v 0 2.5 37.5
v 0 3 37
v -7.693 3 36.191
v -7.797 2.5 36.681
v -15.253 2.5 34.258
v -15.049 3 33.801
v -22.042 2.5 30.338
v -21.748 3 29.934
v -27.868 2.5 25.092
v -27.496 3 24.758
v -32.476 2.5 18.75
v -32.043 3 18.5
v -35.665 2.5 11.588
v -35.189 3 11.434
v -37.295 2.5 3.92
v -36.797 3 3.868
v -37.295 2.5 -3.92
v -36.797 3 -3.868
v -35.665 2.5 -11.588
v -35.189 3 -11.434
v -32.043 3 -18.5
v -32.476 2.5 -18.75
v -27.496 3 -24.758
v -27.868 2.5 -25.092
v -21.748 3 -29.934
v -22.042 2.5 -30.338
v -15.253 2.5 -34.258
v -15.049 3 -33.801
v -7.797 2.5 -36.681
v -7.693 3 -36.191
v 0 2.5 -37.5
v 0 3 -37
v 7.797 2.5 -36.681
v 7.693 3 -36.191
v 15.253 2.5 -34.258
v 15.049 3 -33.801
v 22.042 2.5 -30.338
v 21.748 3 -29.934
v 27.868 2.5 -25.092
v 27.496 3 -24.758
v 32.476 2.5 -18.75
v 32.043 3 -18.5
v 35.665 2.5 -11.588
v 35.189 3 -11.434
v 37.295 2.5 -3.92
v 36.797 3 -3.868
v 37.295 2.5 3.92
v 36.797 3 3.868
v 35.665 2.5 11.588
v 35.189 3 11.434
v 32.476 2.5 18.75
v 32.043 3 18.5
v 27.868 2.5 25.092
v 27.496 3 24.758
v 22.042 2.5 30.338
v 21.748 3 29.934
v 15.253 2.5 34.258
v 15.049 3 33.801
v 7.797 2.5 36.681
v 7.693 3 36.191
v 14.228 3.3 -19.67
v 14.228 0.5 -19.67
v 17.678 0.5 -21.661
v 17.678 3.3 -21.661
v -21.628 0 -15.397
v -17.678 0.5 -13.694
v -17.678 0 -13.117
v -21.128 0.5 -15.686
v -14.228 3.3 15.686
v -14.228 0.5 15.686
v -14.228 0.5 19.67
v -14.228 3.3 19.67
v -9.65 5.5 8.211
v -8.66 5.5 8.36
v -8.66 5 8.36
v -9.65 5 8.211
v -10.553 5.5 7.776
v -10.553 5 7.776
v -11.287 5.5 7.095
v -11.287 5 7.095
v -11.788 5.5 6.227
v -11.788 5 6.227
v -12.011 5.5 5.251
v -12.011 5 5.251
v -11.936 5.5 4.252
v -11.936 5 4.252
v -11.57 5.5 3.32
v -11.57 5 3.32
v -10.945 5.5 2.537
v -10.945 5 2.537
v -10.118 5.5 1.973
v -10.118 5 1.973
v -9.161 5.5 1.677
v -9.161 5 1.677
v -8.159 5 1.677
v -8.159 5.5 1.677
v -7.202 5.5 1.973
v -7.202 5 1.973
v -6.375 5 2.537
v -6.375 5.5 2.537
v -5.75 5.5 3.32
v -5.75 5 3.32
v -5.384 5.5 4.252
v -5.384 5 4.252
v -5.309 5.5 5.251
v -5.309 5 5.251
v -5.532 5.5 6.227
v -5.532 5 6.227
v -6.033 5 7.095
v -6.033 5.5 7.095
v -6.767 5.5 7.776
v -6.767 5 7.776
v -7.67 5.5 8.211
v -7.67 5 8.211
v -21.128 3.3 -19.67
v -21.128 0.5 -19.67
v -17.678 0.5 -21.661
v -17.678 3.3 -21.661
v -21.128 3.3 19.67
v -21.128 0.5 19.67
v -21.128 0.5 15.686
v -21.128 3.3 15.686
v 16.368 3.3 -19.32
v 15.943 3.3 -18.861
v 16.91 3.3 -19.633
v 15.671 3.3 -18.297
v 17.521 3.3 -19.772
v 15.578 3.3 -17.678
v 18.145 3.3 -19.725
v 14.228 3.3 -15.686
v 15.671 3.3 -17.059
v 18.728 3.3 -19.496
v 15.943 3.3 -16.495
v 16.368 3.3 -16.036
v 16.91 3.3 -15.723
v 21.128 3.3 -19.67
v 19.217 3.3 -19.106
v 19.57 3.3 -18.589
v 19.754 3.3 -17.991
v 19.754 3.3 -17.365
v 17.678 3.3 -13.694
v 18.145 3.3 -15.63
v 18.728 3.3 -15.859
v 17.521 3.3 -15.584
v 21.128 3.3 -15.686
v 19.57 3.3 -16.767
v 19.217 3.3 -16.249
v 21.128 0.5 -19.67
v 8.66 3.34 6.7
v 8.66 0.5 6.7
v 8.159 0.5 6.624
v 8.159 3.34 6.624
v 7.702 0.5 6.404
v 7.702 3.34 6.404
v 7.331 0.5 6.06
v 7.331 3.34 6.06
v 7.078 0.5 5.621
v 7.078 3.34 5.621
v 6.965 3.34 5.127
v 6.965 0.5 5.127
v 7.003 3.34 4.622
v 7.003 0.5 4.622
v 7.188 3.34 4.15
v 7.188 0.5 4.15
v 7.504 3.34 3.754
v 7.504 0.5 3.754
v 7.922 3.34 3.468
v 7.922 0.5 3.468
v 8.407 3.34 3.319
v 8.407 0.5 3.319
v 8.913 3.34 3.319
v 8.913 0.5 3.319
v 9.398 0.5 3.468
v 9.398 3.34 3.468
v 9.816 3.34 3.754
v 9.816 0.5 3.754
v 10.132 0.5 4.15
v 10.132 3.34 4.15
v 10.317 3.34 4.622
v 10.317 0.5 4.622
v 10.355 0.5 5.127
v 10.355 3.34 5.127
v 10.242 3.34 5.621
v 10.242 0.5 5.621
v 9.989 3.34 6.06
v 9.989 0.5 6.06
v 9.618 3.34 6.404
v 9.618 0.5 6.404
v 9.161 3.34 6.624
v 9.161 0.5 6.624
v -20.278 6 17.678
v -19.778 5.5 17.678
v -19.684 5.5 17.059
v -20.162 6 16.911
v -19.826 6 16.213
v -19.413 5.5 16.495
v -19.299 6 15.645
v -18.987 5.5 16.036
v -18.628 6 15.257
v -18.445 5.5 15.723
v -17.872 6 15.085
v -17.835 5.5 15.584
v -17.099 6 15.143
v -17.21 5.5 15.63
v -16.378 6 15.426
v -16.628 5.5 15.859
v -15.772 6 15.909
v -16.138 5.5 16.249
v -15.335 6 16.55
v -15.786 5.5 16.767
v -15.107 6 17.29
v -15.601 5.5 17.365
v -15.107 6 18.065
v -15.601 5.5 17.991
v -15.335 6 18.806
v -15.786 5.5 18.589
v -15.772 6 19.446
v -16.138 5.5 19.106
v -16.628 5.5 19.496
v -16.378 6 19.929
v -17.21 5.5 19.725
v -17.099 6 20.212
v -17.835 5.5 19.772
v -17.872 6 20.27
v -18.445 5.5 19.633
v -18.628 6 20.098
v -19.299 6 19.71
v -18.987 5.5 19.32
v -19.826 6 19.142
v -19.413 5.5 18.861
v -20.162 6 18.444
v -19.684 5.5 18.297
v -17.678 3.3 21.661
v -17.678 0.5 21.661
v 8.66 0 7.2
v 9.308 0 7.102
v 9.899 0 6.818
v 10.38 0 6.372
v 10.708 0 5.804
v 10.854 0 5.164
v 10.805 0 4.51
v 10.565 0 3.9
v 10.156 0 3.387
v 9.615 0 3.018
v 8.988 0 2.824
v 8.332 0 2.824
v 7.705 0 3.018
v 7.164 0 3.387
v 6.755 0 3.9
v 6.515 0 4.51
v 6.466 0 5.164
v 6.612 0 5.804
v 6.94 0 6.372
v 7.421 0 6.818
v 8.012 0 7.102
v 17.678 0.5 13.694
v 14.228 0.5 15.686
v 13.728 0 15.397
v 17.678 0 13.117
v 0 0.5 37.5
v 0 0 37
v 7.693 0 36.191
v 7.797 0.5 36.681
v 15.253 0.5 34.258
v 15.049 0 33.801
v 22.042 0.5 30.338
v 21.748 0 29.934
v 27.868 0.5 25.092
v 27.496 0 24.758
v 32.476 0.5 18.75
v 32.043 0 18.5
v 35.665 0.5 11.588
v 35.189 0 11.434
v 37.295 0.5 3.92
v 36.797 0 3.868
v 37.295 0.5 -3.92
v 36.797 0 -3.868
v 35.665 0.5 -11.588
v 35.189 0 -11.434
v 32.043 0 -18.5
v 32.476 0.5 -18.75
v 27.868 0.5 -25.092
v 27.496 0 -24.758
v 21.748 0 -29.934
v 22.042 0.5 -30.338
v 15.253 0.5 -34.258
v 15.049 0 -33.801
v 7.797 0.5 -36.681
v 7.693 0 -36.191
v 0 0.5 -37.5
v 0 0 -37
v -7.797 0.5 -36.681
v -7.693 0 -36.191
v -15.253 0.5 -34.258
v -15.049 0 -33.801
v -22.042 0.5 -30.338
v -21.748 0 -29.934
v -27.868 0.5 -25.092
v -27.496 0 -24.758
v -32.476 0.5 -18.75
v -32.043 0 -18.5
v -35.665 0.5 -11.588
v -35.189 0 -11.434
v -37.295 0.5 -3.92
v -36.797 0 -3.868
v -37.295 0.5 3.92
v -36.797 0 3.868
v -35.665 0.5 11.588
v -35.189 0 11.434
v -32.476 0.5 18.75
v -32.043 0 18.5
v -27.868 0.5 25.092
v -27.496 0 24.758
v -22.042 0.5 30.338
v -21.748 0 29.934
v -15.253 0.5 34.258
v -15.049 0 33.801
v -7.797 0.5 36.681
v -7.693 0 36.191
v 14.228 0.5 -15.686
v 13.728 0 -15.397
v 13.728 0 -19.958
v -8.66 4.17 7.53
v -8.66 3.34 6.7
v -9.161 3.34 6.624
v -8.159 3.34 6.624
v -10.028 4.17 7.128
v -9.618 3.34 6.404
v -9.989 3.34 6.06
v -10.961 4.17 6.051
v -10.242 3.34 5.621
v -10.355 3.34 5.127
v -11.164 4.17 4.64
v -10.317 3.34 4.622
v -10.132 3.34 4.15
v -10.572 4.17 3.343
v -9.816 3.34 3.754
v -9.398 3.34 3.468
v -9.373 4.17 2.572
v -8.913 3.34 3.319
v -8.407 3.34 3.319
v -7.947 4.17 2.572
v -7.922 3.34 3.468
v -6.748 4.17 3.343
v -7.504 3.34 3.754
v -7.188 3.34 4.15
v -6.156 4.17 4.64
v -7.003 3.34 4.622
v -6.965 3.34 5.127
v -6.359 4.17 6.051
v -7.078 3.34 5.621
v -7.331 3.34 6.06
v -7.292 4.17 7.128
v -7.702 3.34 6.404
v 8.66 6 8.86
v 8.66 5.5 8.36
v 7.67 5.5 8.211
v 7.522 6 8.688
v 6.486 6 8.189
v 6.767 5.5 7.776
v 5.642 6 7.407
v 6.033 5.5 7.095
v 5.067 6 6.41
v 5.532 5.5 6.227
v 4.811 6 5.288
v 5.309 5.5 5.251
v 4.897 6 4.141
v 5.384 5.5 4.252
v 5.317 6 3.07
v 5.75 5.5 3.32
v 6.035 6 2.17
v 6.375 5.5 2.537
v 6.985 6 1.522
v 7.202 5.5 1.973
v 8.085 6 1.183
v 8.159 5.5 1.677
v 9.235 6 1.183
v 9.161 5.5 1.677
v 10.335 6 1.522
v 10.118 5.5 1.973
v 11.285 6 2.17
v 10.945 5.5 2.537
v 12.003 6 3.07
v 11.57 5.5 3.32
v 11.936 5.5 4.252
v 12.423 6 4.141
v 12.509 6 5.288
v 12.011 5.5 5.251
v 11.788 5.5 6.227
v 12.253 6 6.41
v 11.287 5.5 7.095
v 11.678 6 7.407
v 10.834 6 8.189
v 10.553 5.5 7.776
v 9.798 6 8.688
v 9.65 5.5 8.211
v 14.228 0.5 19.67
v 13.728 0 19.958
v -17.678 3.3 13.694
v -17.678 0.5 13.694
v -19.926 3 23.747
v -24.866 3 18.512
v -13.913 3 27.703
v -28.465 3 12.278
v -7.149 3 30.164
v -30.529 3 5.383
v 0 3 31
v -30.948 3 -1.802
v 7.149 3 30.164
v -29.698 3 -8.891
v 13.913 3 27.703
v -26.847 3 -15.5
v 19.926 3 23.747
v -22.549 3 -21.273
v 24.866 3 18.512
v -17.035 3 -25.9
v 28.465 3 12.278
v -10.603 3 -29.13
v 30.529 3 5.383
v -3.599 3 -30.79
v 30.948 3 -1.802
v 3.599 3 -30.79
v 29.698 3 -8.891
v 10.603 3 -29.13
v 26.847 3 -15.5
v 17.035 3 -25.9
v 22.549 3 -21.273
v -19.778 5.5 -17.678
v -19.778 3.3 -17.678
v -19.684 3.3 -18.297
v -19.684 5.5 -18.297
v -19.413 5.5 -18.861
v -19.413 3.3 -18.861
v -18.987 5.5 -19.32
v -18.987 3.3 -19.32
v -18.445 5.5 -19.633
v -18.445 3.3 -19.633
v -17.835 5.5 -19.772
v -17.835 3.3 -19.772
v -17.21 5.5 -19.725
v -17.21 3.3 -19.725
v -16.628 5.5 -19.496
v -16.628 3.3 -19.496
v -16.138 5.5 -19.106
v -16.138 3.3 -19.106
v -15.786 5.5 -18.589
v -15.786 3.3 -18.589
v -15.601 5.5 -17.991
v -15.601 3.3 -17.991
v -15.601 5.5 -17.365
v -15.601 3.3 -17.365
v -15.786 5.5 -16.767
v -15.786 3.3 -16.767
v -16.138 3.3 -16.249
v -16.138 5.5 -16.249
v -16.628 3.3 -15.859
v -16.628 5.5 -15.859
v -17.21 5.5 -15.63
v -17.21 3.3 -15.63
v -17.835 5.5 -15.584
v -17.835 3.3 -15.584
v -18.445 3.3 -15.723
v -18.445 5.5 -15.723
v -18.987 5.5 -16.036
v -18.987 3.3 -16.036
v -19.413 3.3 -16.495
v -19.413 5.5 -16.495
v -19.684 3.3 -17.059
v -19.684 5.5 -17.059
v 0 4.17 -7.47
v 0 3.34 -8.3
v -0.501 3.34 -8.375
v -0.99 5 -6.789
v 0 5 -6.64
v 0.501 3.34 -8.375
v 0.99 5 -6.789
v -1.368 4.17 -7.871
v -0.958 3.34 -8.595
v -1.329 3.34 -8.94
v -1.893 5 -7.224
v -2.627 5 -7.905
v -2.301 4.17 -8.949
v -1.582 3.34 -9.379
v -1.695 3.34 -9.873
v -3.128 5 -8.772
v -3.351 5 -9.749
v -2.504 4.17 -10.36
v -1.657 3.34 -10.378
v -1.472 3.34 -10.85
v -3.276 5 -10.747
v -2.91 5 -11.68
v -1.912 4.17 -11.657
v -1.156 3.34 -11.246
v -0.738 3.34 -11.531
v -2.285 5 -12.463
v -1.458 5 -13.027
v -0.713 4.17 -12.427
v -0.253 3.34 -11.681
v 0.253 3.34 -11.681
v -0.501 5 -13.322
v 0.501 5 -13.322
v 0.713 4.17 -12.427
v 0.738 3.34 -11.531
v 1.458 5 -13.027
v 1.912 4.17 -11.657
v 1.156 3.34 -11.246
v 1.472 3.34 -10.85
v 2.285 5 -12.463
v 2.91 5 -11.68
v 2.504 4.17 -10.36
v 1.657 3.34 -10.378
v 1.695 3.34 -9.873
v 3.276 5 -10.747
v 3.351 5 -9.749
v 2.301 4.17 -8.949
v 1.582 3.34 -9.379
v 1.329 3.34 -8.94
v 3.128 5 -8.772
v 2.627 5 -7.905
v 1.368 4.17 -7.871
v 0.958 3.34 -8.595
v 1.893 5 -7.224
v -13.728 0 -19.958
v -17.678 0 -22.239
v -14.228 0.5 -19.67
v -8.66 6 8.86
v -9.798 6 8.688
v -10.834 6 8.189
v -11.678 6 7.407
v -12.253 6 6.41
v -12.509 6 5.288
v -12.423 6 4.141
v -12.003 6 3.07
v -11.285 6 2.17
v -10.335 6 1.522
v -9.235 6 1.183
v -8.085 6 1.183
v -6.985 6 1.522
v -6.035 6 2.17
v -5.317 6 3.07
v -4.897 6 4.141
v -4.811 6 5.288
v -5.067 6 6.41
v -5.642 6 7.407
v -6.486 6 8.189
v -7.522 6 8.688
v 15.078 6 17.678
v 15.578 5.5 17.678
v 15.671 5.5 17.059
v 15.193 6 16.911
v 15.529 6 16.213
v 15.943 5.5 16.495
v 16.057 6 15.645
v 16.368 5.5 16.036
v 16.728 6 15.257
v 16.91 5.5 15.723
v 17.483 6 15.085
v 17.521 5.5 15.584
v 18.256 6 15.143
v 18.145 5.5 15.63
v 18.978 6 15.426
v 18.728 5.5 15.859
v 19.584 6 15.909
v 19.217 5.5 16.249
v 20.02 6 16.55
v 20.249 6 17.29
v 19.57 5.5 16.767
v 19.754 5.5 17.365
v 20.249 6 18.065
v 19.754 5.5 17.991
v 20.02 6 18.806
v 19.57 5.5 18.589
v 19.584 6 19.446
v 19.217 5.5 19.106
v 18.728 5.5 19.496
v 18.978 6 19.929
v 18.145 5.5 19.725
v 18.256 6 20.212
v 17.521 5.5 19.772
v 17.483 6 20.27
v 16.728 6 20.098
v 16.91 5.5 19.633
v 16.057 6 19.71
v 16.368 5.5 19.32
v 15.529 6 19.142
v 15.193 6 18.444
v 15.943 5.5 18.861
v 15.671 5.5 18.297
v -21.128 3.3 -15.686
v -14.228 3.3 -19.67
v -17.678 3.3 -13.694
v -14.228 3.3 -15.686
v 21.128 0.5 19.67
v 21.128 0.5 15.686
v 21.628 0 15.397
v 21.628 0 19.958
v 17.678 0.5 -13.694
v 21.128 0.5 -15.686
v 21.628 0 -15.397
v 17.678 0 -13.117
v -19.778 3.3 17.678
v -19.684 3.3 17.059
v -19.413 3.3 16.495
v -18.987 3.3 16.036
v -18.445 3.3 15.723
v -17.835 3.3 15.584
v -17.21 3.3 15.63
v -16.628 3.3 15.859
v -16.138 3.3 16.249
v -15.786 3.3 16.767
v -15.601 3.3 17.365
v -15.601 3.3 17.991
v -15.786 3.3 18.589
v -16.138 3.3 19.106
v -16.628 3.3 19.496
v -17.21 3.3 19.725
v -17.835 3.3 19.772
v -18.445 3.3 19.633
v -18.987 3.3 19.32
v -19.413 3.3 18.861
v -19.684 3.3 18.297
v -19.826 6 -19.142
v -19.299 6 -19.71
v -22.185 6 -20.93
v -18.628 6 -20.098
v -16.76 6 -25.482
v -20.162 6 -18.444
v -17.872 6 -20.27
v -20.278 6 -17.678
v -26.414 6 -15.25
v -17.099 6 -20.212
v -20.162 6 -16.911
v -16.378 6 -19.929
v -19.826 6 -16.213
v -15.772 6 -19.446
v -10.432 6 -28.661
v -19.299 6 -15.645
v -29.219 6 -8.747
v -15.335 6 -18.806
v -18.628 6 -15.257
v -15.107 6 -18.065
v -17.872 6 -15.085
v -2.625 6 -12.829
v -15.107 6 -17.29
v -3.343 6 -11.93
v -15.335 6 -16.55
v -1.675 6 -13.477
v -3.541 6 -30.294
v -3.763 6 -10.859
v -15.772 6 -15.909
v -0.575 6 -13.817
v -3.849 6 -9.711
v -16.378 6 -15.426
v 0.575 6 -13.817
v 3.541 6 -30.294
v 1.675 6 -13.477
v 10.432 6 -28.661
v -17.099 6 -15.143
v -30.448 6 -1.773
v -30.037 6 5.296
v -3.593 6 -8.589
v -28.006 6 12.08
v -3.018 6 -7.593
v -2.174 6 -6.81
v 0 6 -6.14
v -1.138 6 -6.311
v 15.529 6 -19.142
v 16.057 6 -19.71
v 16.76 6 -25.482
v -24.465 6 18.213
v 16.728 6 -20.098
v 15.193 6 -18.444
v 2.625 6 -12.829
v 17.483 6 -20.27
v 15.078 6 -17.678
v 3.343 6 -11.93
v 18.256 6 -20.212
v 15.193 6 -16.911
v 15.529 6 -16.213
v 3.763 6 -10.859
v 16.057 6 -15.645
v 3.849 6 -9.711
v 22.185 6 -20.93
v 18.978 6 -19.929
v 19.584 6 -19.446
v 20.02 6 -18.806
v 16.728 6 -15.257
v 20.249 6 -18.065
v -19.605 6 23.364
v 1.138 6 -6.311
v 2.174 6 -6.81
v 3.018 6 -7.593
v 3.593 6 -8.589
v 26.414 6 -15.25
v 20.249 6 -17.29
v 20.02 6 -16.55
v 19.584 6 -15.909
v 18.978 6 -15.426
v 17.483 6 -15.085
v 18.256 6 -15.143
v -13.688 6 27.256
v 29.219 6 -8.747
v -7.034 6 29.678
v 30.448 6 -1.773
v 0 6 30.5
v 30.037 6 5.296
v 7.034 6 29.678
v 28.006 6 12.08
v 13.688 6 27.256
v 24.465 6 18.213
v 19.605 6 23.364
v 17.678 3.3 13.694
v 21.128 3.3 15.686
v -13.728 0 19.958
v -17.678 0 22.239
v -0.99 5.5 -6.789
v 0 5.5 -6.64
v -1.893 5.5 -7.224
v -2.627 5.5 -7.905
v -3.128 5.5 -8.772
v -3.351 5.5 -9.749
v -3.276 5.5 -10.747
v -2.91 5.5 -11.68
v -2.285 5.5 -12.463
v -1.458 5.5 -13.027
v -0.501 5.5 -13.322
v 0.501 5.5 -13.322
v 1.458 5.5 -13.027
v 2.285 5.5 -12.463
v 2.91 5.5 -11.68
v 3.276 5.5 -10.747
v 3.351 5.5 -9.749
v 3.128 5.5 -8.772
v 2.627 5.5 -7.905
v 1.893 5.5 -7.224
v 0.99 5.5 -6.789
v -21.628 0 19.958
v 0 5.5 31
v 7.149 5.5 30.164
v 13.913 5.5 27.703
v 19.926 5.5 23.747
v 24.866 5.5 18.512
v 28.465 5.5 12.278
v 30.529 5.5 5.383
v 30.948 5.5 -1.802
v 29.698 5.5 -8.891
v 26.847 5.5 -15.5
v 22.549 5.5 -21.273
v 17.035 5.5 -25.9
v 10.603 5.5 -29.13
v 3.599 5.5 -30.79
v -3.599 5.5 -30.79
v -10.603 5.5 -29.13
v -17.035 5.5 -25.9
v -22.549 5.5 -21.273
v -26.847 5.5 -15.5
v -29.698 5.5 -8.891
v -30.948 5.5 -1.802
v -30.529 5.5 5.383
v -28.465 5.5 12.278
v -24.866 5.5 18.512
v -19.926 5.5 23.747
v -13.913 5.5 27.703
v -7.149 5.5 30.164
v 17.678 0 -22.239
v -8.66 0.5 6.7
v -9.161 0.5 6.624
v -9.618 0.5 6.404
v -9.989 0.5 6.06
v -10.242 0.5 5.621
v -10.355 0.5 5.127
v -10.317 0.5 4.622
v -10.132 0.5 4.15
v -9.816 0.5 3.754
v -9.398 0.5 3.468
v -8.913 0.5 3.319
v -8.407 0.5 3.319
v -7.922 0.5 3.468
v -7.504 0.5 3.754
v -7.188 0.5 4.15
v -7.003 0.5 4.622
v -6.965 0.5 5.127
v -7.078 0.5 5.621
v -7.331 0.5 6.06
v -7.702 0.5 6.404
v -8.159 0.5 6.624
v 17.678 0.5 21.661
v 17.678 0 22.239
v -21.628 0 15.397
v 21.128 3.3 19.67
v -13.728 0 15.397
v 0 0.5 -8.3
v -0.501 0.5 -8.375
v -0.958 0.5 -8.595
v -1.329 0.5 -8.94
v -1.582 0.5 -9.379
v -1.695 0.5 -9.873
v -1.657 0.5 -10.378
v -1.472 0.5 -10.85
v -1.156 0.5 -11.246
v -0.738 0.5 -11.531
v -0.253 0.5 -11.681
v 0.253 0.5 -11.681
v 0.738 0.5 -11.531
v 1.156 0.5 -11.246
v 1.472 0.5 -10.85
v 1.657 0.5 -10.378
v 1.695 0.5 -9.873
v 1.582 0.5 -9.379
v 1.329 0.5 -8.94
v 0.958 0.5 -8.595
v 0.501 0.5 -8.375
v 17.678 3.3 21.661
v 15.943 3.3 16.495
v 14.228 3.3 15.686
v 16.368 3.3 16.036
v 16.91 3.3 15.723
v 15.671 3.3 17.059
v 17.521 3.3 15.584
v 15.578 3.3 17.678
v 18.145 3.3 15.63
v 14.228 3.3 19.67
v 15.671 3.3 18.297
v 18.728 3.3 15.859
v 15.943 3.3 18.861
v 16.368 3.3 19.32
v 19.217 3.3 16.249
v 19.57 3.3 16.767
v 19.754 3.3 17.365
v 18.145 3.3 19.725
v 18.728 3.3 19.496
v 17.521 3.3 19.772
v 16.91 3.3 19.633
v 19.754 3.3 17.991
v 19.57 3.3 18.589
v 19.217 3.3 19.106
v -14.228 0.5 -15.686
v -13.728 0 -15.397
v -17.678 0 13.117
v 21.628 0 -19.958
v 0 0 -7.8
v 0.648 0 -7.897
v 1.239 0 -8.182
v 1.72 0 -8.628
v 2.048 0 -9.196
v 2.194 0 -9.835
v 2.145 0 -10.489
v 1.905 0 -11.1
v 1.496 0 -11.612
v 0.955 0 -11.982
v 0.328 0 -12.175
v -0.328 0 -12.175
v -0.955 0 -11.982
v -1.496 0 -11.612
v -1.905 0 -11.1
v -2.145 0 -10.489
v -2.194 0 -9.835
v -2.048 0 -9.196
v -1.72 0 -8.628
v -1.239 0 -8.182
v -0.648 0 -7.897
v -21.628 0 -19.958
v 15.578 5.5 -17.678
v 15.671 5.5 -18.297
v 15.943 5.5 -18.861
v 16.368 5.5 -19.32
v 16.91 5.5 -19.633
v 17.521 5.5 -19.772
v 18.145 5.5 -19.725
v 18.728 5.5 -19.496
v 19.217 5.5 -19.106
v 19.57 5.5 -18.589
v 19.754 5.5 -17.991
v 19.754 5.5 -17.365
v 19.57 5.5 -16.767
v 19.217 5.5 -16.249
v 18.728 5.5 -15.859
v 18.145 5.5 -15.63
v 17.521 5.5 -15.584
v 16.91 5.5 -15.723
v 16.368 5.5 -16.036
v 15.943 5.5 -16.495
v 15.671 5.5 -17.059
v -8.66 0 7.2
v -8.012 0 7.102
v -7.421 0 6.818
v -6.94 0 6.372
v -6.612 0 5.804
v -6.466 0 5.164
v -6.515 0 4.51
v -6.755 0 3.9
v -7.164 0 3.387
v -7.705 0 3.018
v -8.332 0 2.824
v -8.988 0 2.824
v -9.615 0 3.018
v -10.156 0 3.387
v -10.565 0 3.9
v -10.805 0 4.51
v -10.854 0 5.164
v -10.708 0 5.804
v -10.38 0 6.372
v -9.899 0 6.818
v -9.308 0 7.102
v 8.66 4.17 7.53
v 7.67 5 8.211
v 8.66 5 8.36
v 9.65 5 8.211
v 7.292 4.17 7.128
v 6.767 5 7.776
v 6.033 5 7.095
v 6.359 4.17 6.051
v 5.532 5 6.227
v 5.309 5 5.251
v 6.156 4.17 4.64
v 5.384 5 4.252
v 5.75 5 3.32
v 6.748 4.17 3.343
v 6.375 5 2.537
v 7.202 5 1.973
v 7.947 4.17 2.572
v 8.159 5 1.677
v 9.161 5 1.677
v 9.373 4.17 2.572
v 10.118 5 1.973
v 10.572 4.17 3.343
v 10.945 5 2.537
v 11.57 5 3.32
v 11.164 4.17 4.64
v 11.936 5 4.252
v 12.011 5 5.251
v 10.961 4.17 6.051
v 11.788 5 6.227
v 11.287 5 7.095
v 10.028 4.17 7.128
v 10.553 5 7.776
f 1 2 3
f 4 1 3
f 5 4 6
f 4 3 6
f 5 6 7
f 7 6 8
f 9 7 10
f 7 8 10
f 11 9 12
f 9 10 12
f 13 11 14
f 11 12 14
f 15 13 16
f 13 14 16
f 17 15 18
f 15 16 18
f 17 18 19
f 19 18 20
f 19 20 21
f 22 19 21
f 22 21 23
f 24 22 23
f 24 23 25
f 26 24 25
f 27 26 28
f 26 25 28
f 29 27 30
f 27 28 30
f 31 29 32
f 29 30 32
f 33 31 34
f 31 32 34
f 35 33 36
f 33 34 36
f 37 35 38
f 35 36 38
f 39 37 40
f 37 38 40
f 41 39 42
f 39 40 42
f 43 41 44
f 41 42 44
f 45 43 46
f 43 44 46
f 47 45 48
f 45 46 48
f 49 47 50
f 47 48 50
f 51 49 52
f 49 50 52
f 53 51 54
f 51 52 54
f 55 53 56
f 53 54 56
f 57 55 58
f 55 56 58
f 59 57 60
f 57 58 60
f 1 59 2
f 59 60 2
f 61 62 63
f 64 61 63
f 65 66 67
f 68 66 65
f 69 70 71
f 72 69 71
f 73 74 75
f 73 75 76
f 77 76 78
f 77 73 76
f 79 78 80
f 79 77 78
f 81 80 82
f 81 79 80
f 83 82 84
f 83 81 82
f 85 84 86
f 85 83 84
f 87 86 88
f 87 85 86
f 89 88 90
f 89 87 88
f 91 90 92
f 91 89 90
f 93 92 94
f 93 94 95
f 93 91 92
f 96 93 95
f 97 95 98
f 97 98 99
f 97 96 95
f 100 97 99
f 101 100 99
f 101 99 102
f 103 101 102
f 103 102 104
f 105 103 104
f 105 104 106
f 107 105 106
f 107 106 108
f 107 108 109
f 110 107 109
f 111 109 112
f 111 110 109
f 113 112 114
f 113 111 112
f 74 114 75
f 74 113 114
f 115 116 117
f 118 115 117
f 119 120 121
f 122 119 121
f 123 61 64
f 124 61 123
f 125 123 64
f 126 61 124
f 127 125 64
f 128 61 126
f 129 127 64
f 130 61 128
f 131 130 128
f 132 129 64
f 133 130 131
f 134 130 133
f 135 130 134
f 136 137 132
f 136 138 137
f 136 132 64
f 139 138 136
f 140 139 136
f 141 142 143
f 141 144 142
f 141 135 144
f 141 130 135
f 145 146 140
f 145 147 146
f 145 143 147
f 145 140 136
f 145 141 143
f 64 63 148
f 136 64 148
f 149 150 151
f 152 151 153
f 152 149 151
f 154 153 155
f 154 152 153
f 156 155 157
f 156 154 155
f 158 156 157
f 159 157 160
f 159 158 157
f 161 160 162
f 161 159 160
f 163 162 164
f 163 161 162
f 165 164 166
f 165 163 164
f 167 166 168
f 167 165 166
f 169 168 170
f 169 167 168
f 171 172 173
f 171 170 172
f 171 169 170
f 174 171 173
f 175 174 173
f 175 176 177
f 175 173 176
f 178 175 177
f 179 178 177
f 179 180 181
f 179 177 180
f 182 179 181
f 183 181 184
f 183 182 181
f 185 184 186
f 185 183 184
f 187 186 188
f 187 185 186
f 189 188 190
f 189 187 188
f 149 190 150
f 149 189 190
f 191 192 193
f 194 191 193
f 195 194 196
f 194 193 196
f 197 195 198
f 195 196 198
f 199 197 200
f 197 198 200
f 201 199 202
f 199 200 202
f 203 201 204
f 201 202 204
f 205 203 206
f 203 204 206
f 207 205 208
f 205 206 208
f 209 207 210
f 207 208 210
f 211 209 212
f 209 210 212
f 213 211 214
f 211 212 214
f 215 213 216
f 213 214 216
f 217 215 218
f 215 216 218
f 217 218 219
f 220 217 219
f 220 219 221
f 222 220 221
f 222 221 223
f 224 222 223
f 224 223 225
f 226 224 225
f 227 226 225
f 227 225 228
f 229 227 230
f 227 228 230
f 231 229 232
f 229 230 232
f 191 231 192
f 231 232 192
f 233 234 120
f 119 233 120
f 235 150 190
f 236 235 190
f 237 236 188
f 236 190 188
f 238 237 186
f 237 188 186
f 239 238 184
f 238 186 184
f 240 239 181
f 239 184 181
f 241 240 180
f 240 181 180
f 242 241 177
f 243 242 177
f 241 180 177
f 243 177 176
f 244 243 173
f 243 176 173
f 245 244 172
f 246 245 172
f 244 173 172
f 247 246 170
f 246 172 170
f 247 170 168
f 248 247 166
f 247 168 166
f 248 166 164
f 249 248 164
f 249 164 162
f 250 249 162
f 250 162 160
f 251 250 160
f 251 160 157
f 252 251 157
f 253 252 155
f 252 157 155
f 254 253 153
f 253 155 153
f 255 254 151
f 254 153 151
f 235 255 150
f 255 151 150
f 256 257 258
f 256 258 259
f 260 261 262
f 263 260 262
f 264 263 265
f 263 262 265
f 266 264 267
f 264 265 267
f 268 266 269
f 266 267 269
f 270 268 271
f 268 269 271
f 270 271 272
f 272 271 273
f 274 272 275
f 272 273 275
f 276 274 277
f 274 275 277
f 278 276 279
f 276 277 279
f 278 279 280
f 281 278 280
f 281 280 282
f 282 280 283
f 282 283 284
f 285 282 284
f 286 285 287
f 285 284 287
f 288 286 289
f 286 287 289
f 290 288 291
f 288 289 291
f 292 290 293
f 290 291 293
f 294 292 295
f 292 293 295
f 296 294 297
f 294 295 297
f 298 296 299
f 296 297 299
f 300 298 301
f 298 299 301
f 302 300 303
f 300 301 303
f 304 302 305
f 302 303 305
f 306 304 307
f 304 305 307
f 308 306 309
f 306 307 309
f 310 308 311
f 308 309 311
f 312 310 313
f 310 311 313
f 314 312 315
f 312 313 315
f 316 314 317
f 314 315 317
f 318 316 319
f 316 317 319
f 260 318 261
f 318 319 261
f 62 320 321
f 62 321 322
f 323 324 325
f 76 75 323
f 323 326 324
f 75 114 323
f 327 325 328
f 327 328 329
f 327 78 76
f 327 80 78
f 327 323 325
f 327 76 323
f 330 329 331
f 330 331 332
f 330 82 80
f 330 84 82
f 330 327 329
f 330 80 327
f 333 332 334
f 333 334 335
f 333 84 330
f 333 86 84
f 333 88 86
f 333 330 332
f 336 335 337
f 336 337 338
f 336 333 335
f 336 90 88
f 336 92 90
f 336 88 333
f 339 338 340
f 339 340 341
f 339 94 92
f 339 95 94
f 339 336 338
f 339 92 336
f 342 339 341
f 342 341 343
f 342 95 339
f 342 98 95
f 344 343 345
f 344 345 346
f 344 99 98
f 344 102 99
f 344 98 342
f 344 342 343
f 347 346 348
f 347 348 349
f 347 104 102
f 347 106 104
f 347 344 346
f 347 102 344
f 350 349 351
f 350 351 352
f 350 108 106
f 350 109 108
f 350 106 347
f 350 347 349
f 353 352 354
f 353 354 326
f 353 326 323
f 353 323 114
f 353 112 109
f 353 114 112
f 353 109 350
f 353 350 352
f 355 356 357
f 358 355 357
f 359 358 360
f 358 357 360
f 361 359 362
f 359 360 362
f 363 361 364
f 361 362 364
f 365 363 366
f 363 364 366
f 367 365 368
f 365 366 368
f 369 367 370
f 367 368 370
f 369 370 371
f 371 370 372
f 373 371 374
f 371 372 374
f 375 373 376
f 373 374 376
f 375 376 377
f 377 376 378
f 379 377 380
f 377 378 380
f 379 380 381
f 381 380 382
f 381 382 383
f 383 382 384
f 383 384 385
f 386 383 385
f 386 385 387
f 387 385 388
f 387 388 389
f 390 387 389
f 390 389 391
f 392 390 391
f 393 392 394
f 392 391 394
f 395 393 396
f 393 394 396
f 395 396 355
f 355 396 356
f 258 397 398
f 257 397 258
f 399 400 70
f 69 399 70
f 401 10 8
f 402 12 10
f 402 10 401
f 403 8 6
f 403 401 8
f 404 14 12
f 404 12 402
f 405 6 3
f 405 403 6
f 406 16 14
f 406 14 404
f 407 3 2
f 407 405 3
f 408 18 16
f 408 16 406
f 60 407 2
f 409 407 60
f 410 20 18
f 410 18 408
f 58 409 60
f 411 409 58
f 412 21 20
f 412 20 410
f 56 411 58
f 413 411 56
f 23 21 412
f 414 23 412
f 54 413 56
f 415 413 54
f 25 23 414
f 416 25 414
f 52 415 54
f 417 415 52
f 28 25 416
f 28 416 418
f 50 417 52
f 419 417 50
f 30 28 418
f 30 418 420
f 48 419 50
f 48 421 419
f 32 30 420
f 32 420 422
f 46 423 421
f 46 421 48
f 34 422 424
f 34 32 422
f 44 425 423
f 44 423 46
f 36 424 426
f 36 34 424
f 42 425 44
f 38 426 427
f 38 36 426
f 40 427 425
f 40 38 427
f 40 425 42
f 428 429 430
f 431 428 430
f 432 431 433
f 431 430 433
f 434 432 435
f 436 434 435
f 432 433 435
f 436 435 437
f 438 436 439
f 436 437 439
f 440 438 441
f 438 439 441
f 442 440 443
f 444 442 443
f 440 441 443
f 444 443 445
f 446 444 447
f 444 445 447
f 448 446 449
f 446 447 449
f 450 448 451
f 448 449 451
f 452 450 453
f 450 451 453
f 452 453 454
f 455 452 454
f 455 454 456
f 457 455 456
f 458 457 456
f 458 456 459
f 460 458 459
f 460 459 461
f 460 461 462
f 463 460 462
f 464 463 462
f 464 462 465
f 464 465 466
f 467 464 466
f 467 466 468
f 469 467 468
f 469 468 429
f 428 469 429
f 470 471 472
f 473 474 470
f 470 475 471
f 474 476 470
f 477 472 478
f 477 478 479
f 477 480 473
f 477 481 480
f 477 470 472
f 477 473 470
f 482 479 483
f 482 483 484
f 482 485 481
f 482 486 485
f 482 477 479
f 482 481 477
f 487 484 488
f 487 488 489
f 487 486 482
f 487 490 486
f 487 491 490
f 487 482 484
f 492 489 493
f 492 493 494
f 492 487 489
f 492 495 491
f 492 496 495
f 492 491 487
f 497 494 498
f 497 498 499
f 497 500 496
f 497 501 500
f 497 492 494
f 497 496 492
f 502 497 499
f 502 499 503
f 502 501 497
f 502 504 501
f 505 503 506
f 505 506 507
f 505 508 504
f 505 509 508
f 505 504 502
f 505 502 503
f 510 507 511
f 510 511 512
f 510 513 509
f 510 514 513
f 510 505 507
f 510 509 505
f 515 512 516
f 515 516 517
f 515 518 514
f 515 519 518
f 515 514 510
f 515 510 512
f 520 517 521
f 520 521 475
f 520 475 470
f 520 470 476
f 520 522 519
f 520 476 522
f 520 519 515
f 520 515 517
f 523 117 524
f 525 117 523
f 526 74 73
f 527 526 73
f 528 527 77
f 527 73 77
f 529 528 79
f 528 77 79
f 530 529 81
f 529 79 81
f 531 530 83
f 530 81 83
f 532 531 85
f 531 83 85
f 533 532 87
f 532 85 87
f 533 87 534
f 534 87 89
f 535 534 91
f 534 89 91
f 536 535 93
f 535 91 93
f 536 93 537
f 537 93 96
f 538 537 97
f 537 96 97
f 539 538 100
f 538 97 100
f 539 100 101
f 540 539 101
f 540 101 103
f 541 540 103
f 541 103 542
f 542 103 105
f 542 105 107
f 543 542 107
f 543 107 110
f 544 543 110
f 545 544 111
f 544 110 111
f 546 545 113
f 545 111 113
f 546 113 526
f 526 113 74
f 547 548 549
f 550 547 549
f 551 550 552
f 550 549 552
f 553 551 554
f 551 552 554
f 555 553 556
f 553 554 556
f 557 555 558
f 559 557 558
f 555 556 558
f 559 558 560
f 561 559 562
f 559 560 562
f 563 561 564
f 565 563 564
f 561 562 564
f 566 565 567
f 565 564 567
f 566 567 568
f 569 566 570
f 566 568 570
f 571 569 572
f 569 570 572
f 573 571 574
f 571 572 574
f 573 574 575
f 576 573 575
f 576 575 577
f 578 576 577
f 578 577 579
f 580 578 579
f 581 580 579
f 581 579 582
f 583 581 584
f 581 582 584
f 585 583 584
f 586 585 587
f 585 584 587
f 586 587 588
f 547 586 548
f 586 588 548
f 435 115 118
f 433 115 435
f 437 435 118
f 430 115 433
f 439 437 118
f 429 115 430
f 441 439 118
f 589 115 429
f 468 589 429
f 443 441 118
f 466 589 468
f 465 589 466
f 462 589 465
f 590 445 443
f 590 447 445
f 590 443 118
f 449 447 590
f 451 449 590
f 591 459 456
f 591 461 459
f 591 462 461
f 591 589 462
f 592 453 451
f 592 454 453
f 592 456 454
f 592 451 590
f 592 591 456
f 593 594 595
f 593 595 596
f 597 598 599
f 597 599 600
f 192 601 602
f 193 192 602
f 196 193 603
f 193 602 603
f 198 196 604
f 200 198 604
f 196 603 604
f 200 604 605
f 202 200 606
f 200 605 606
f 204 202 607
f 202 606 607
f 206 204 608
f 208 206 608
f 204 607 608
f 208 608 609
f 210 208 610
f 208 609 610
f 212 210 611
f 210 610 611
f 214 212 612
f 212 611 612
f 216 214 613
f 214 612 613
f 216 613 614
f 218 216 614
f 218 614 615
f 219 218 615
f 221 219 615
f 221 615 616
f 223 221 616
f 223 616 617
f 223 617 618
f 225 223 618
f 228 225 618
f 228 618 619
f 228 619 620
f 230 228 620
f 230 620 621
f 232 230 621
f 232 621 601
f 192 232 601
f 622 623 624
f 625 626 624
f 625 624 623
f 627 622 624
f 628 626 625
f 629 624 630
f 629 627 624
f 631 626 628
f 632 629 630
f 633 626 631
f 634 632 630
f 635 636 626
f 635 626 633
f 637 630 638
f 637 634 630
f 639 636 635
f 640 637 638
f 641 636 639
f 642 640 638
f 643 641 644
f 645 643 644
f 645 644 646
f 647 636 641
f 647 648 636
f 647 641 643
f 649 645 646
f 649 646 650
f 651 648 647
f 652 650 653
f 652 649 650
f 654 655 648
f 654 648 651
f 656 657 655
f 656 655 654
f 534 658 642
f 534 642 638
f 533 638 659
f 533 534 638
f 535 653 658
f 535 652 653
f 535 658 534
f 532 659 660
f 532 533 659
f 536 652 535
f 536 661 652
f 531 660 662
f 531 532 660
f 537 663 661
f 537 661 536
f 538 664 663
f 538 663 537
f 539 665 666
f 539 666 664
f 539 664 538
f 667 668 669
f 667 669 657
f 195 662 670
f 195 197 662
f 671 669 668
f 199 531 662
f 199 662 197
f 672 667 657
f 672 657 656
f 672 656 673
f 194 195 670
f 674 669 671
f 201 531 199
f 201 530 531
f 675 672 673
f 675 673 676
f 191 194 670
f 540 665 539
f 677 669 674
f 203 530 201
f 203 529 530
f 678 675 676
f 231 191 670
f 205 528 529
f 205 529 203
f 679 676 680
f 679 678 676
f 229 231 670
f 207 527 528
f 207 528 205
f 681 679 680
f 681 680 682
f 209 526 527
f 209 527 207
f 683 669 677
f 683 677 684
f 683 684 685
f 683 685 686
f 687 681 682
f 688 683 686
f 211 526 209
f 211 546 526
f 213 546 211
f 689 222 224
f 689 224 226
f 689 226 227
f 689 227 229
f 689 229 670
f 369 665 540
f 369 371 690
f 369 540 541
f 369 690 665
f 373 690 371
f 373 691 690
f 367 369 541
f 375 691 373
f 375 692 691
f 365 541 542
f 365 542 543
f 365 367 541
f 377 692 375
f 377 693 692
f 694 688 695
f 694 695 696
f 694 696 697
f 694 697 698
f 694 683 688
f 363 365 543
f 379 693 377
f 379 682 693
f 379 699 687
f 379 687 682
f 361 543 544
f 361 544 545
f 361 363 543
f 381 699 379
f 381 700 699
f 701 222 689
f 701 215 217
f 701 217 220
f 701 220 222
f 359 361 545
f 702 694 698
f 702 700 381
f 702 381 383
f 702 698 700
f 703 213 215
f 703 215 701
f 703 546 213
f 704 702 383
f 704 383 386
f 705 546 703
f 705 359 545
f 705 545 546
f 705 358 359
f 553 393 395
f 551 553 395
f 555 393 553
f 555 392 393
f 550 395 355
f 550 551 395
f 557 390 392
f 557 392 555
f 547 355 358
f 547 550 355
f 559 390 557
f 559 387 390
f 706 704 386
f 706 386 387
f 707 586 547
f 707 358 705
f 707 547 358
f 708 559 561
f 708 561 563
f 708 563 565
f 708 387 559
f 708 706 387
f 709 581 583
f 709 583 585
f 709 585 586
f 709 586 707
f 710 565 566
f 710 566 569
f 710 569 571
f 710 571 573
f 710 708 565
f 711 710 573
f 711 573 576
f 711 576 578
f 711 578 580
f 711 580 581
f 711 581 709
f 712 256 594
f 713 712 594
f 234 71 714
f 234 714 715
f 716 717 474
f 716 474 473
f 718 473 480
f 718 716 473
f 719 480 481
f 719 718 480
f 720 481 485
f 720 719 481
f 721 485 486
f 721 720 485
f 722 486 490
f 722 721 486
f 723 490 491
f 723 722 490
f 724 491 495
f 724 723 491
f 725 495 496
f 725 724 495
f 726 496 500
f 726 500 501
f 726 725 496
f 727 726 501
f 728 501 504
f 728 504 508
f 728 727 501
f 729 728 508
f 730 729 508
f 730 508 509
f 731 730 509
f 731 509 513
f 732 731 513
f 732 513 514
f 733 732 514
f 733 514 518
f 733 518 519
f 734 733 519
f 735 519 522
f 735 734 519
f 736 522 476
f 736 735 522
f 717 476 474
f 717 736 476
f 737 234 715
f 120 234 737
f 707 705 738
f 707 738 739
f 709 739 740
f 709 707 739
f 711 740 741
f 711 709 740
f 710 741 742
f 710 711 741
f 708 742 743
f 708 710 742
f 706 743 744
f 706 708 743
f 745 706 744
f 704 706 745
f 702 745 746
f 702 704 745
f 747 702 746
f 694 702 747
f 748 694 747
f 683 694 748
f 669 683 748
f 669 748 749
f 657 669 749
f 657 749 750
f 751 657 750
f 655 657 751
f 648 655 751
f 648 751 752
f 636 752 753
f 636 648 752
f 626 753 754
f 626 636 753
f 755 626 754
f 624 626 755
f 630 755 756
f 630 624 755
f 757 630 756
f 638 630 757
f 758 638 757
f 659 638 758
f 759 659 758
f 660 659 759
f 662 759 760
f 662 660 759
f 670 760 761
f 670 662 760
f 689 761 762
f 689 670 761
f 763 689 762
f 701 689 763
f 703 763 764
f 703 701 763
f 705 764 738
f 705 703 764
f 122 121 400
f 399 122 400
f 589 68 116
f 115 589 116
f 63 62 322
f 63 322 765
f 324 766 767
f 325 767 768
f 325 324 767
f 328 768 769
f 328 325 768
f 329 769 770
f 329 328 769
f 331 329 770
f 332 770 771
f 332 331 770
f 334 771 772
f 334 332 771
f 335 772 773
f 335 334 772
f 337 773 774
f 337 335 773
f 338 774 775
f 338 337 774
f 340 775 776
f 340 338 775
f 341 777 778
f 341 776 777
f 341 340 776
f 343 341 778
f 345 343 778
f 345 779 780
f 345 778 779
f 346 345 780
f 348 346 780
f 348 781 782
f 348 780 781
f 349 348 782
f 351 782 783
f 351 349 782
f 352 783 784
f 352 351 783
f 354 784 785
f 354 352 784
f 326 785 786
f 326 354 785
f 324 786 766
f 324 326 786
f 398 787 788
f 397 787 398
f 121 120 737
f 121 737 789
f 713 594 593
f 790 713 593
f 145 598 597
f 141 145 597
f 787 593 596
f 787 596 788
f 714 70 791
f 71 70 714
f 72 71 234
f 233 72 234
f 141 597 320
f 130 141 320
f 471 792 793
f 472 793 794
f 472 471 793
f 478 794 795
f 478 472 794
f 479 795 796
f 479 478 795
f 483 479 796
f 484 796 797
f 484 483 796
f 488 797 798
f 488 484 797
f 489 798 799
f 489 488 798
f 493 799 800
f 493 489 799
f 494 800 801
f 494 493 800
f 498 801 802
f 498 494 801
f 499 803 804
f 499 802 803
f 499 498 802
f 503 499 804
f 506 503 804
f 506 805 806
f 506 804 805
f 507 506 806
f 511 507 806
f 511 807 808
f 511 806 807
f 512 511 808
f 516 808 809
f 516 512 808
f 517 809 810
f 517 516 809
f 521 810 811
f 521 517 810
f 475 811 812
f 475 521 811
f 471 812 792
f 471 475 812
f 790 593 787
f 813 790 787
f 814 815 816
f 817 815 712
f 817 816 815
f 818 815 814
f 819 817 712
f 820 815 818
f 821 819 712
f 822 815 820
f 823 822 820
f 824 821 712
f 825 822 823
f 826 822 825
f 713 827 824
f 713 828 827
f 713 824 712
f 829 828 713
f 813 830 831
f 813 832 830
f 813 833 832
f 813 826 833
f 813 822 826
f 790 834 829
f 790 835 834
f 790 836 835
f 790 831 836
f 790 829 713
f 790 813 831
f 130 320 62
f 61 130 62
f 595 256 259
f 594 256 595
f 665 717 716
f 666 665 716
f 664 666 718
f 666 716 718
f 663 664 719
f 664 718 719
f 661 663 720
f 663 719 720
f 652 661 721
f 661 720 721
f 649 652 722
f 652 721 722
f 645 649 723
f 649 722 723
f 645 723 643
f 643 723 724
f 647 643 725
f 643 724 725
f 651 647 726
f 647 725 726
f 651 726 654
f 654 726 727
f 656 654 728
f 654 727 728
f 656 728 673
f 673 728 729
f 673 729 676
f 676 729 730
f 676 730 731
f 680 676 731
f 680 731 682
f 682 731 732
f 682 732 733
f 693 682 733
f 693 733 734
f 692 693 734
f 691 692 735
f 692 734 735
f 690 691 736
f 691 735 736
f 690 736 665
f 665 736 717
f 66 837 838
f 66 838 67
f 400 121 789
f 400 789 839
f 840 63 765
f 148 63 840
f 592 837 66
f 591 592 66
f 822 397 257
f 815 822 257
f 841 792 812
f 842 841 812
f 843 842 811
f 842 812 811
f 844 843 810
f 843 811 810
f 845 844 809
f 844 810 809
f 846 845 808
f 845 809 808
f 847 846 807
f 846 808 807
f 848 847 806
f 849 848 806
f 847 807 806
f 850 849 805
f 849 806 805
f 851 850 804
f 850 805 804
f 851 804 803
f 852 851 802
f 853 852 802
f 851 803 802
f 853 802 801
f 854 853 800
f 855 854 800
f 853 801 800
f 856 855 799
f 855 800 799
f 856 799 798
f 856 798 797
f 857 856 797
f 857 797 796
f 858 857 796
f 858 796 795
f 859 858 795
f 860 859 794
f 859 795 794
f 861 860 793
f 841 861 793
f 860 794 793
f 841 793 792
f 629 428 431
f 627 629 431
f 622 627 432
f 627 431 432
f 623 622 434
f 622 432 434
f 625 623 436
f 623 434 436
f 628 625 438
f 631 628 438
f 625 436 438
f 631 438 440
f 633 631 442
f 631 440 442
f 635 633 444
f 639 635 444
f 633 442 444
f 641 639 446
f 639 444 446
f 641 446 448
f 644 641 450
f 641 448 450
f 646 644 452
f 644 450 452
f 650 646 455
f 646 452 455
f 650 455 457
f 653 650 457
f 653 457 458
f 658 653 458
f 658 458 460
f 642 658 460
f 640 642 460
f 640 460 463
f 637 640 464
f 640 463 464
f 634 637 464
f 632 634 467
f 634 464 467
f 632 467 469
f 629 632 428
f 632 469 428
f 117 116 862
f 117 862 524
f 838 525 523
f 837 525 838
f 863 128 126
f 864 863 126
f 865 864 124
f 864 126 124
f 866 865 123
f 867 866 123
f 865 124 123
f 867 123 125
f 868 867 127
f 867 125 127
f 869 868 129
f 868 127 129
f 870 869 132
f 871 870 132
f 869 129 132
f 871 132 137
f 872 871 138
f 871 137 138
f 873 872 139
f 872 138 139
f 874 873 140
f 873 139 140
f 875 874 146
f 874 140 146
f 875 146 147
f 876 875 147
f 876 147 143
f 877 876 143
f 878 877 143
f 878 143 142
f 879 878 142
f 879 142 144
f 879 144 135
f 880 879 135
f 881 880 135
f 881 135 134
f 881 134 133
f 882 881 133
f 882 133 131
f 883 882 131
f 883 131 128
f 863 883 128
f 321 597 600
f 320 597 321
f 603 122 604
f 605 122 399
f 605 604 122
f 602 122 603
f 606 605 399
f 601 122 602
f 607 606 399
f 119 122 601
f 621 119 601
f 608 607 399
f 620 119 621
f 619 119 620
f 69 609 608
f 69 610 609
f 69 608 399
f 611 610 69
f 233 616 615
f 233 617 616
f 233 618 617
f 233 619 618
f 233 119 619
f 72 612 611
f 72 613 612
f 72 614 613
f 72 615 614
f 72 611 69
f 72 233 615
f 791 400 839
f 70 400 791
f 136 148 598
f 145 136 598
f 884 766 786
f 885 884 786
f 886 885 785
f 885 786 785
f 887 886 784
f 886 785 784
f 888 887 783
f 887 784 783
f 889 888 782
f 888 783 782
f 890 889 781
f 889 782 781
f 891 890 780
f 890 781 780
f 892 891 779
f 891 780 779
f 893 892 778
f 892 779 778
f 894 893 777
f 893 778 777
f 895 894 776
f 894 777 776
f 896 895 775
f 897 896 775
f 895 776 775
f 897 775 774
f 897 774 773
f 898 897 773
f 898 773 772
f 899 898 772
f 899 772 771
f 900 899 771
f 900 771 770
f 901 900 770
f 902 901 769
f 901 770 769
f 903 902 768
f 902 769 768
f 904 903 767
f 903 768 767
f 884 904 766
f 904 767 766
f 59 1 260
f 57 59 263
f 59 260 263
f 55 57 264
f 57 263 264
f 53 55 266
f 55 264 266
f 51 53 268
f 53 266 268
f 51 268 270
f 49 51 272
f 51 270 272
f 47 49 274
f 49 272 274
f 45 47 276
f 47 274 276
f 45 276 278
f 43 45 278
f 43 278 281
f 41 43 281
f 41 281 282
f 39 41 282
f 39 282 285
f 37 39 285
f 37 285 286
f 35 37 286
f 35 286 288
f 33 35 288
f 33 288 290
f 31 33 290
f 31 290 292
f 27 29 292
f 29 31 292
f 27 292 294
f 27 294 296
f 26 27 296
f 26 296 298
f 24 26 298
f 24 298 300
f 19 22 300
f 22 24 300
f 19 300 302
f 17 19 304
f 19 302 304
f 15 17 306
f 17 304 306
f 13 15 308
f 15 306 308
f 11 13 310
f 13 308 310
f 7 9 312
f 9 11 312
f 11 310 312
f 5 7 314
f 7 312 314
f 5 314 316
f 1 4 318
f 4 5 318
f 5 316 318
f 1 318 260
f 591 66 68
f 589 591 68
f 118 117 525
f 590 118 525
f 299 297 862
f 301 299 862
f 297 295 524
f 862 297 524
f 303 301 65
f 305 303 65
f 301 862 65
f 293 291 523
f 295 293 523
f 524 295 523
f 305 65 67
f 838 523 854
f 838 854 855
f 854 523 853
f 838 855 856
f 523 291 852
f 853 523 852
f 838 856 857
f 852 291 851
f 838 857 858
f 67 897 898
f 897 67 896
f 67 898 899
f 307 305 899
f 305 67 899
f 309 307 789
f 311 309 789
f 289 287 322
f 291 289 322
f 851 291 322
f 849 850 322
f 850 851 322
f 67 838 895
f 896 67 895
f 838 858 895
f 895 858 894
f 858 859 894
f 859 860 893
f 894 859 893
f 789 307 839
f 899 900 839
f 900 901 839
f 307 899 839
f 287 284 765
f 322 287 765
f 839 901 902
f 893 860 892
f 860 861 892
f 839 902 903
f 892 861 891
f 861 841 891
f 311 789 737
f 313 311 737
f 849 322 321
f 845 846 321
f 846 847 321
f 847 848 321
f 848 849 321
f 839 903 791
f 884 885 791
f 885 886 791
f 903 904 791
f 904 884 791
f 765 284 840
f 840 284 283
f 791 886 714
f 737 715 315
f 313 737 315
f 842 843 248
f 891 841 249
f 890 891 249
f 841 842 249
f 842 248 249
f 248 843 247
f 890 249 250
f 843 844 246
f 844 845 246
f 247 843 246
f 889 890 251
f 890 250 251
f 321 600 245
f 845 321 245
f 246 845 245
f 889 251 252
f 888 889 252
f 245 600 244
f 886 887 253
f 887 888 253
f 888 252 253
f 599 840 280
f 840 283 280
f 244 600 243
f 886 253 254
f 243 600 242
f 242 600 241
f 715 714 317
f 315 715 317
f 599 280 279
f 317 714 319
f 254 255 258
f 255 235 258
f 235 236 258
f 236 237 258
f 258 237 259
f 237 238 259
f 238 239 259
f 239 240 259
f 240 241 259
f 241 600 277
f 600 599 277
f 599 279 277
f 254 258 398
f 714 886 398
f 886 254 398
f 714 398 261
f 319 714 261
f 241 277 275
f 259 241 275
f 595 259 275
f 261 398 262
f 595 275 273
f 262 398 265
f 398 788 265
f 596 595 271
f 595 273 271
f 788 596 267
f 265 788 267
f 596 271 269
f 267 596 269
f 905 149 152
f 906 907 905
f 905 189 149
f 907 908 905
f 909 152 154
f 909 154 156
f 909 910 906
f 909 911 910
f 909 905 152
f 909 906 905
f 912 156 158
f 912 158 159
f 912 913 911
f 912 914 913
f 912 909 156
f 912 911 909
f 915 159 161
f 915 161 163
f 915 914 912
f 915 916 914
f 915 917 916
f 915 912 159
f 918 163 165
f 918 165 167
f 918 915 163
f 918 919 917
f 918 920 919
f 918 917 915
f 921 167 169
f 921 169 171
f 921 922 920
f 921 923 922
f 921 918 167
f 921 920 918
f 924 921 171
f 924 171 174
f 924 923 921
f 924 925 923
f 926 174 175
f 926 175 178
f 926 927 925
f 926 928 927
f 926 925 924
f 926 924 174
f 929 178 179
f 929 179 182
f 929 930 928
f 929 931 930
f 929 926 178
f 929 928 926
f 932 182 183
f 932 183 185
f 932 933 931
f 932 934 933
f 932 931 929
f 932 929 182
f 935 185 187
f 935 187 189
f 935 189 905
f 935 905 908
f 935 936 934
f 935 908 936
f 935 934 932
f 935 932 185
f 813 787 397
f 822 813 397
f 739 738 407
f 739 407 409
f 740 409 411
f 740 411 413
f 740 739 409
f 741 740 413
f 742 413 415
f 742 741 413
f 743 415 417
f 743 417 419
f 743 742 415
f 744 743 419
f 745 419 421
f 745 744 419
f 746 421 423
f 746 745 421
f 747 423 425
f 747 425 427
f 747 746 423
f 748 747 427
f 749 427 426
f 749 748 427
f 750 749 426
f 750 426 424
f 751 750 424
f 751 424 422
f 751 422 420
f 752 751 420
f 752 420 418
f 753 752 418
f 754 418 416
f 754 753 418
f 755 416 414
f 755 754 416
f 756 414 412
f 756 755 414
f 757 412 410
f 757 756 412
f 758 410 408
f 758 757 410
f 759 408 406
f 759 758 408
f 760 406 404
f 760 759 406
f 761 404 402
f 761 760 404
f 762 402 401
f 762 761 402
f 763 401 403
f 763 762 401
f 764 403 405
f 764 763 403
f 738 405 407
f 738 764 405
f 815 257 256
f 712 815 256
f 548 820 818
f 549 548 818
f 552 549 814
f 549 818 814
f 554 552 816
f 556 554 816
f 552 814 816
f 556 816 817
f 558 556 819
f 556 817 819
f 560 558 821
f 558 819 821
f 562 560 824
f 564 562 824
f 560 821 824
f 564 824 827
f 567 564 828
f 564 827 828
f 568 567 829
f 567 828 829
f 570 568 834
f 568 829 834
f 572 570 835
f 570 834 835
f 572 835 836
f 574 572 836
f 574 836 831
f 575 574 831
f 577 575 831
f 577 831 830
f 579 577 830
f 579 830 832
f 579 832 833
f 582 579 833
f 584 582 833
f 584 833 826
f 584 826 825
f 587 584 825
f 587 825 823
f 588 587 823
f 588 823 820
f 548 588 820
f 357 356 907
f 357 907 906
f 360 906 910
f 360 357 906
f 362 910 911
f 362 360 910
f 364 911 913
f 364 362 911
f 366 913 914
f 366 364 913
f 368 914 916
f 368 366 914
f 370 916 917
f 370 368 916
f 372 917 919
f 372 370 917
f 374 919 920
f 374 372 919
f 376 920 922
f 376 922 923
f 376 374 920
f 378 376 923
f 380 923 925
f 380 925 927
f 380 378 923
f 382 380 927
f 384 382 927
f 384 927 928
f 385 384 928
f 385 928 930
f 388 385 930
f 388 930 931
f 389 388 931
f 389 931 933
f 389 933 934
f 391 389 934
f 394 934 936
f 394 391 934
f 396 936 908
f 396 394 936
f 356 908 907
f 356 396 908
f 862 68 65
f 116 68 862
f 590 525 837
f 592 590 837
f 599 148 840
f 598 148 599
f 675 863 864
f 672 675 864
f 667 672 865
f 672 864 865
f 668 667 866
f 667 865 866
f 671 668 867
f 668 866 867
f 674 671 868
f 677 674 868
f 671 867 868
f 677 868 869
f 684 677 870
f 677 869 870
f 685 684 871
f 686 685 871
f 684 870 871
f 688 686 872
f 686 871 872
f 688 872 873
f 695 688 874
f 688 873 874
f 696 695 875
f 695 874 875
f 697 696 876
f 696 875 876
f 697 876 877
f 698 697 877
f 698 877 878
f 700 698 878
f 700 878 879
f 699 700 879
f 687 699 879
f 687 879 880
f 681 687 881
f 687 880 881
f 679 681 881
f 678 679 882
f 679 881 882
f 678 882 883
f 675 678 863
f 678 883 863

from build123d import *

# Parameters (mm, degrees)
SKETCH1_R                    = 37.5
BOSS_EXTRUDE1_DEPTH          = 6
CSK_FOR_M3_SFHCS1_AT_2_COUNT = 2
CSK_FOR_M3_SFHCS1_AT_2_PITCH = 17.32
CSK_FOR_M3_SFHCS1_AT_3_COUNT = 2
CSK_FOR_M3_SFHCS1_AT_3_PITCH = 17.32
SKETCH5_OUTSIDE_W            = 98.248
SKETCH5_OUTSIDE_H            = 98.248
SKETCH5_OUTSIDE_R            = 31
CUT_EXTRUDE2_DEPTH           = 3
F_4_0MM_DOWEL_HOLE1_D        = 4.2
F_4_0MM_DOWEL_HOLE1_DEPTH    = 10
F_4_0MM_DOWEL_HOLE1_TIP      = 1.2618073
CUT_EXTRUDE3_DEPTH           = 3.3
CHAMFER1_SIZE                = 0.5


with BuildPart() as part:
    # Sketch1 → Boss-Extrude1 (new body)
    with BuildSketch(Plane(origin=(0, 0, 0), x_dir=(1, 0, 0), z_dir=(0, 1, 0))):
        with Locations(Location((0, 0, 0), (0, 0, 270))):
            Circle(SKETCH1_R)
    extrude(amount=BOSS_EXTRUDE1_DEPTH)

    # Sketch3 → CSK for M3 SFHCS1 (revolve, cut)
    with BuildSketch(Plane(origin=(8.66, 6, 4.999853331), x_dir=(0, 0, 1), z_dir=(1, 0, 0))):
        Polygon((0, 0), (0, 11.021463052), (1.7, 10), (1.7, 2.66), (3.36, 1), (3.36, 0), align=None)
    csk_for_m3_sfhcs1 = revolve(axis=Axis((8.66, 12.35, 4.999853331), (0, -1, 0)), mode=Mode.SUBTRACT)

    # CSK for M3 SFHCS1 at 2: CSK for M3 SFHCS1 ×2
    with Locations(*[Vector(-0.5000000000000001, 0, -0.8660254037844387) * (i * CSK_FOR_M3_SFHCS1_AT_2_PITCH) for i in range(1, CSK_FOR_M3_SFHCS1_AT_2_COUNT)]):
        add(csk_for_m3_sfhcs1, mode=Mode.SUBTRACT)

    # CSK for M3 SFHCS1 at 3: CSK for M3 SFHCS1 ×2
    with Locations(*[(-i * CSK_FOR_M3_SFHCS1_AT_3_PITCH, 0, 0) for i in range(1, CSK_FOR_M3_SFHCS1_AT_3_COUNT)]):
        add(csk_for_m3_sfhcs1, mode=Mode.SUBTRACT)

    # Sketch5 outside → Cut-Extrude2 (cut)
    with BuildSketch(Plane(origin=(0, 6, 0), x_dir=(1, 0, 0), z_dir=(0, 1, 0))):
        Rectangle(SKETCH5_OUTSIDE_W, SKETCH5_OUTSIDE_H)
        with Locations(Location((0, 0, 0), (0, 0, 270))):
            Circle(SKETCH5_OUTSIDE_R, mode=Mode.SUBTRACT)
    extrude(amount=-CUT_EXTRUDE2_DEPTH, mode=Mode.SUBTRACT)

    # Ø4.0mm Dowel Hole1
    with Locations(Plane(origin=(0, 6, 0), x_dir=(1, 0, 0), z_dir=(0, 1, 0))):
        with Locations((17.67766953, 17.67766953), (-17.67766953, 17.67766953), (17.67766953, -17.67766953), (-17.67766953, -17.67766953)):
            Hole(F_4_0MM_DOWEL_HOLE1_D / 2, depth=F_4_0MM_DOWEL_HOLE1_DEPTH)
            with Locations((0, 0, -(F_4_0MM_DOWEL_HOLE1_DEPTH + F_4_0MM_DOWEL_HOLE1_TIP / 2))):  # 118° drill point
                Cone(0, F_4_0MM_DOWEL_HOLE1_D / 2, F_4_0MM_DOWEL_HOLE1_TIP, mode=Mode.SUBTRACT)

    # Sketch8 → Cut-Extrude3 (cut)
    with BuildSketch(Plane.XZ):
        Polygon((-14.22766953, 15.685811101), (-14.22766953, 19.669527958), (-17.67766953, 21.661386387), (-21.12766953, 19.669527958), (-21.12766953, 15.685811101), (-17.67766953, 13.693952672), align=None)
        Polygon((17.67766953, 13.693952672), (21.12766953, 15.685811101), (21.12766953, 19.669527958), (17.67766953, 21.661386387), (14.22766953, 19.669527958), (14.22766953, 15.685811101), align=None)
        Polygon((14.22766953, -19.669527958), (17.67766953, -21.661386387), (21.12766953, -19.669527958), (21.12766953, -15.685811101), (17.67766953, -13.693952672), (14.22766953, -15.685811101), align=None)
        Polygon((-14.22766953, -19.669527958), (-14.22766953, -15.685811101), (-17.67766953, -13.693952672), (-21.12766953, -15.685811101), (-21.12766953, -19.669527958), (-17.67766953, -21.661386387), align=None)
    extrude(amount=-CUT_EXTRUDE3_DEPTH, mode=Mode.SUBTRACT)

    # Chamfer1
    chamfer1_edges = [part.edges().sort_by_distance(p)[0] for p in [
        (15.95266953, 0, 14.689881887),
        (19.40266953, 0, 14.689881887),
        (21.12766953, 0, 17.67766953),
        (19.40266953, 0, 20.665457173),
        (15.95266953, 0, 20.665457173),
        (14.22766953, 0, 17.67766953),
        (-15.95266953, 0, 14.689881887),
        (-14.22766953, 0, 17.67766953),
        (-15.95266953, 0, 20.665457173),
        (-19.40266953, 0, 20.665457173),
        (-21.12766953, 0, 17.67766953),
        (-19.40266953, 0, 14.689881887),
        (-8.66, 0, 3.299853331),
        (-8.66, 6, 1.639853331),
        (0, 0, -37.5),
        (0, 0, -11.699706662),
        (0, 6, -13.359706662),
        (0, 3, -37.5),
        (0, 6, -31),
        (19.77766953, 6, -17.67766953),
        (-15.57766953, 6, 17.67766953),
        (19.77766953, 6, 17.67766953),
        (-15.57766953, 6, -17.67766953),
        (8.66, 0, 3.299853331),
        (8.66, 6, 1.639853331),
        (-15.95266953, 0, -20.665457173),
        (-14.22766953, 0, -17.67766953),
        (-15.95266953, 0, -14.689881887),
        (-19.40266953, 0, -14.689881887),
        (-21.12766953, 0, -17.67766953),
        (-19.40266953, 0, -20.665457173),
        (14.22766953, 0, -17.67766953),
        (15.95266953, 0, -20.665457173),
        (19.40266953, 0, -20.665457173),
        (21.12766953, 0, -17.67766953),
        (19.40266953, 0, -14.689881887),
        (15.95266953, 0, -14.689881887),
    ]]
    chamfer(chamfer1_edges, length=CHAMFER1_SIZE)


solid = part.part
